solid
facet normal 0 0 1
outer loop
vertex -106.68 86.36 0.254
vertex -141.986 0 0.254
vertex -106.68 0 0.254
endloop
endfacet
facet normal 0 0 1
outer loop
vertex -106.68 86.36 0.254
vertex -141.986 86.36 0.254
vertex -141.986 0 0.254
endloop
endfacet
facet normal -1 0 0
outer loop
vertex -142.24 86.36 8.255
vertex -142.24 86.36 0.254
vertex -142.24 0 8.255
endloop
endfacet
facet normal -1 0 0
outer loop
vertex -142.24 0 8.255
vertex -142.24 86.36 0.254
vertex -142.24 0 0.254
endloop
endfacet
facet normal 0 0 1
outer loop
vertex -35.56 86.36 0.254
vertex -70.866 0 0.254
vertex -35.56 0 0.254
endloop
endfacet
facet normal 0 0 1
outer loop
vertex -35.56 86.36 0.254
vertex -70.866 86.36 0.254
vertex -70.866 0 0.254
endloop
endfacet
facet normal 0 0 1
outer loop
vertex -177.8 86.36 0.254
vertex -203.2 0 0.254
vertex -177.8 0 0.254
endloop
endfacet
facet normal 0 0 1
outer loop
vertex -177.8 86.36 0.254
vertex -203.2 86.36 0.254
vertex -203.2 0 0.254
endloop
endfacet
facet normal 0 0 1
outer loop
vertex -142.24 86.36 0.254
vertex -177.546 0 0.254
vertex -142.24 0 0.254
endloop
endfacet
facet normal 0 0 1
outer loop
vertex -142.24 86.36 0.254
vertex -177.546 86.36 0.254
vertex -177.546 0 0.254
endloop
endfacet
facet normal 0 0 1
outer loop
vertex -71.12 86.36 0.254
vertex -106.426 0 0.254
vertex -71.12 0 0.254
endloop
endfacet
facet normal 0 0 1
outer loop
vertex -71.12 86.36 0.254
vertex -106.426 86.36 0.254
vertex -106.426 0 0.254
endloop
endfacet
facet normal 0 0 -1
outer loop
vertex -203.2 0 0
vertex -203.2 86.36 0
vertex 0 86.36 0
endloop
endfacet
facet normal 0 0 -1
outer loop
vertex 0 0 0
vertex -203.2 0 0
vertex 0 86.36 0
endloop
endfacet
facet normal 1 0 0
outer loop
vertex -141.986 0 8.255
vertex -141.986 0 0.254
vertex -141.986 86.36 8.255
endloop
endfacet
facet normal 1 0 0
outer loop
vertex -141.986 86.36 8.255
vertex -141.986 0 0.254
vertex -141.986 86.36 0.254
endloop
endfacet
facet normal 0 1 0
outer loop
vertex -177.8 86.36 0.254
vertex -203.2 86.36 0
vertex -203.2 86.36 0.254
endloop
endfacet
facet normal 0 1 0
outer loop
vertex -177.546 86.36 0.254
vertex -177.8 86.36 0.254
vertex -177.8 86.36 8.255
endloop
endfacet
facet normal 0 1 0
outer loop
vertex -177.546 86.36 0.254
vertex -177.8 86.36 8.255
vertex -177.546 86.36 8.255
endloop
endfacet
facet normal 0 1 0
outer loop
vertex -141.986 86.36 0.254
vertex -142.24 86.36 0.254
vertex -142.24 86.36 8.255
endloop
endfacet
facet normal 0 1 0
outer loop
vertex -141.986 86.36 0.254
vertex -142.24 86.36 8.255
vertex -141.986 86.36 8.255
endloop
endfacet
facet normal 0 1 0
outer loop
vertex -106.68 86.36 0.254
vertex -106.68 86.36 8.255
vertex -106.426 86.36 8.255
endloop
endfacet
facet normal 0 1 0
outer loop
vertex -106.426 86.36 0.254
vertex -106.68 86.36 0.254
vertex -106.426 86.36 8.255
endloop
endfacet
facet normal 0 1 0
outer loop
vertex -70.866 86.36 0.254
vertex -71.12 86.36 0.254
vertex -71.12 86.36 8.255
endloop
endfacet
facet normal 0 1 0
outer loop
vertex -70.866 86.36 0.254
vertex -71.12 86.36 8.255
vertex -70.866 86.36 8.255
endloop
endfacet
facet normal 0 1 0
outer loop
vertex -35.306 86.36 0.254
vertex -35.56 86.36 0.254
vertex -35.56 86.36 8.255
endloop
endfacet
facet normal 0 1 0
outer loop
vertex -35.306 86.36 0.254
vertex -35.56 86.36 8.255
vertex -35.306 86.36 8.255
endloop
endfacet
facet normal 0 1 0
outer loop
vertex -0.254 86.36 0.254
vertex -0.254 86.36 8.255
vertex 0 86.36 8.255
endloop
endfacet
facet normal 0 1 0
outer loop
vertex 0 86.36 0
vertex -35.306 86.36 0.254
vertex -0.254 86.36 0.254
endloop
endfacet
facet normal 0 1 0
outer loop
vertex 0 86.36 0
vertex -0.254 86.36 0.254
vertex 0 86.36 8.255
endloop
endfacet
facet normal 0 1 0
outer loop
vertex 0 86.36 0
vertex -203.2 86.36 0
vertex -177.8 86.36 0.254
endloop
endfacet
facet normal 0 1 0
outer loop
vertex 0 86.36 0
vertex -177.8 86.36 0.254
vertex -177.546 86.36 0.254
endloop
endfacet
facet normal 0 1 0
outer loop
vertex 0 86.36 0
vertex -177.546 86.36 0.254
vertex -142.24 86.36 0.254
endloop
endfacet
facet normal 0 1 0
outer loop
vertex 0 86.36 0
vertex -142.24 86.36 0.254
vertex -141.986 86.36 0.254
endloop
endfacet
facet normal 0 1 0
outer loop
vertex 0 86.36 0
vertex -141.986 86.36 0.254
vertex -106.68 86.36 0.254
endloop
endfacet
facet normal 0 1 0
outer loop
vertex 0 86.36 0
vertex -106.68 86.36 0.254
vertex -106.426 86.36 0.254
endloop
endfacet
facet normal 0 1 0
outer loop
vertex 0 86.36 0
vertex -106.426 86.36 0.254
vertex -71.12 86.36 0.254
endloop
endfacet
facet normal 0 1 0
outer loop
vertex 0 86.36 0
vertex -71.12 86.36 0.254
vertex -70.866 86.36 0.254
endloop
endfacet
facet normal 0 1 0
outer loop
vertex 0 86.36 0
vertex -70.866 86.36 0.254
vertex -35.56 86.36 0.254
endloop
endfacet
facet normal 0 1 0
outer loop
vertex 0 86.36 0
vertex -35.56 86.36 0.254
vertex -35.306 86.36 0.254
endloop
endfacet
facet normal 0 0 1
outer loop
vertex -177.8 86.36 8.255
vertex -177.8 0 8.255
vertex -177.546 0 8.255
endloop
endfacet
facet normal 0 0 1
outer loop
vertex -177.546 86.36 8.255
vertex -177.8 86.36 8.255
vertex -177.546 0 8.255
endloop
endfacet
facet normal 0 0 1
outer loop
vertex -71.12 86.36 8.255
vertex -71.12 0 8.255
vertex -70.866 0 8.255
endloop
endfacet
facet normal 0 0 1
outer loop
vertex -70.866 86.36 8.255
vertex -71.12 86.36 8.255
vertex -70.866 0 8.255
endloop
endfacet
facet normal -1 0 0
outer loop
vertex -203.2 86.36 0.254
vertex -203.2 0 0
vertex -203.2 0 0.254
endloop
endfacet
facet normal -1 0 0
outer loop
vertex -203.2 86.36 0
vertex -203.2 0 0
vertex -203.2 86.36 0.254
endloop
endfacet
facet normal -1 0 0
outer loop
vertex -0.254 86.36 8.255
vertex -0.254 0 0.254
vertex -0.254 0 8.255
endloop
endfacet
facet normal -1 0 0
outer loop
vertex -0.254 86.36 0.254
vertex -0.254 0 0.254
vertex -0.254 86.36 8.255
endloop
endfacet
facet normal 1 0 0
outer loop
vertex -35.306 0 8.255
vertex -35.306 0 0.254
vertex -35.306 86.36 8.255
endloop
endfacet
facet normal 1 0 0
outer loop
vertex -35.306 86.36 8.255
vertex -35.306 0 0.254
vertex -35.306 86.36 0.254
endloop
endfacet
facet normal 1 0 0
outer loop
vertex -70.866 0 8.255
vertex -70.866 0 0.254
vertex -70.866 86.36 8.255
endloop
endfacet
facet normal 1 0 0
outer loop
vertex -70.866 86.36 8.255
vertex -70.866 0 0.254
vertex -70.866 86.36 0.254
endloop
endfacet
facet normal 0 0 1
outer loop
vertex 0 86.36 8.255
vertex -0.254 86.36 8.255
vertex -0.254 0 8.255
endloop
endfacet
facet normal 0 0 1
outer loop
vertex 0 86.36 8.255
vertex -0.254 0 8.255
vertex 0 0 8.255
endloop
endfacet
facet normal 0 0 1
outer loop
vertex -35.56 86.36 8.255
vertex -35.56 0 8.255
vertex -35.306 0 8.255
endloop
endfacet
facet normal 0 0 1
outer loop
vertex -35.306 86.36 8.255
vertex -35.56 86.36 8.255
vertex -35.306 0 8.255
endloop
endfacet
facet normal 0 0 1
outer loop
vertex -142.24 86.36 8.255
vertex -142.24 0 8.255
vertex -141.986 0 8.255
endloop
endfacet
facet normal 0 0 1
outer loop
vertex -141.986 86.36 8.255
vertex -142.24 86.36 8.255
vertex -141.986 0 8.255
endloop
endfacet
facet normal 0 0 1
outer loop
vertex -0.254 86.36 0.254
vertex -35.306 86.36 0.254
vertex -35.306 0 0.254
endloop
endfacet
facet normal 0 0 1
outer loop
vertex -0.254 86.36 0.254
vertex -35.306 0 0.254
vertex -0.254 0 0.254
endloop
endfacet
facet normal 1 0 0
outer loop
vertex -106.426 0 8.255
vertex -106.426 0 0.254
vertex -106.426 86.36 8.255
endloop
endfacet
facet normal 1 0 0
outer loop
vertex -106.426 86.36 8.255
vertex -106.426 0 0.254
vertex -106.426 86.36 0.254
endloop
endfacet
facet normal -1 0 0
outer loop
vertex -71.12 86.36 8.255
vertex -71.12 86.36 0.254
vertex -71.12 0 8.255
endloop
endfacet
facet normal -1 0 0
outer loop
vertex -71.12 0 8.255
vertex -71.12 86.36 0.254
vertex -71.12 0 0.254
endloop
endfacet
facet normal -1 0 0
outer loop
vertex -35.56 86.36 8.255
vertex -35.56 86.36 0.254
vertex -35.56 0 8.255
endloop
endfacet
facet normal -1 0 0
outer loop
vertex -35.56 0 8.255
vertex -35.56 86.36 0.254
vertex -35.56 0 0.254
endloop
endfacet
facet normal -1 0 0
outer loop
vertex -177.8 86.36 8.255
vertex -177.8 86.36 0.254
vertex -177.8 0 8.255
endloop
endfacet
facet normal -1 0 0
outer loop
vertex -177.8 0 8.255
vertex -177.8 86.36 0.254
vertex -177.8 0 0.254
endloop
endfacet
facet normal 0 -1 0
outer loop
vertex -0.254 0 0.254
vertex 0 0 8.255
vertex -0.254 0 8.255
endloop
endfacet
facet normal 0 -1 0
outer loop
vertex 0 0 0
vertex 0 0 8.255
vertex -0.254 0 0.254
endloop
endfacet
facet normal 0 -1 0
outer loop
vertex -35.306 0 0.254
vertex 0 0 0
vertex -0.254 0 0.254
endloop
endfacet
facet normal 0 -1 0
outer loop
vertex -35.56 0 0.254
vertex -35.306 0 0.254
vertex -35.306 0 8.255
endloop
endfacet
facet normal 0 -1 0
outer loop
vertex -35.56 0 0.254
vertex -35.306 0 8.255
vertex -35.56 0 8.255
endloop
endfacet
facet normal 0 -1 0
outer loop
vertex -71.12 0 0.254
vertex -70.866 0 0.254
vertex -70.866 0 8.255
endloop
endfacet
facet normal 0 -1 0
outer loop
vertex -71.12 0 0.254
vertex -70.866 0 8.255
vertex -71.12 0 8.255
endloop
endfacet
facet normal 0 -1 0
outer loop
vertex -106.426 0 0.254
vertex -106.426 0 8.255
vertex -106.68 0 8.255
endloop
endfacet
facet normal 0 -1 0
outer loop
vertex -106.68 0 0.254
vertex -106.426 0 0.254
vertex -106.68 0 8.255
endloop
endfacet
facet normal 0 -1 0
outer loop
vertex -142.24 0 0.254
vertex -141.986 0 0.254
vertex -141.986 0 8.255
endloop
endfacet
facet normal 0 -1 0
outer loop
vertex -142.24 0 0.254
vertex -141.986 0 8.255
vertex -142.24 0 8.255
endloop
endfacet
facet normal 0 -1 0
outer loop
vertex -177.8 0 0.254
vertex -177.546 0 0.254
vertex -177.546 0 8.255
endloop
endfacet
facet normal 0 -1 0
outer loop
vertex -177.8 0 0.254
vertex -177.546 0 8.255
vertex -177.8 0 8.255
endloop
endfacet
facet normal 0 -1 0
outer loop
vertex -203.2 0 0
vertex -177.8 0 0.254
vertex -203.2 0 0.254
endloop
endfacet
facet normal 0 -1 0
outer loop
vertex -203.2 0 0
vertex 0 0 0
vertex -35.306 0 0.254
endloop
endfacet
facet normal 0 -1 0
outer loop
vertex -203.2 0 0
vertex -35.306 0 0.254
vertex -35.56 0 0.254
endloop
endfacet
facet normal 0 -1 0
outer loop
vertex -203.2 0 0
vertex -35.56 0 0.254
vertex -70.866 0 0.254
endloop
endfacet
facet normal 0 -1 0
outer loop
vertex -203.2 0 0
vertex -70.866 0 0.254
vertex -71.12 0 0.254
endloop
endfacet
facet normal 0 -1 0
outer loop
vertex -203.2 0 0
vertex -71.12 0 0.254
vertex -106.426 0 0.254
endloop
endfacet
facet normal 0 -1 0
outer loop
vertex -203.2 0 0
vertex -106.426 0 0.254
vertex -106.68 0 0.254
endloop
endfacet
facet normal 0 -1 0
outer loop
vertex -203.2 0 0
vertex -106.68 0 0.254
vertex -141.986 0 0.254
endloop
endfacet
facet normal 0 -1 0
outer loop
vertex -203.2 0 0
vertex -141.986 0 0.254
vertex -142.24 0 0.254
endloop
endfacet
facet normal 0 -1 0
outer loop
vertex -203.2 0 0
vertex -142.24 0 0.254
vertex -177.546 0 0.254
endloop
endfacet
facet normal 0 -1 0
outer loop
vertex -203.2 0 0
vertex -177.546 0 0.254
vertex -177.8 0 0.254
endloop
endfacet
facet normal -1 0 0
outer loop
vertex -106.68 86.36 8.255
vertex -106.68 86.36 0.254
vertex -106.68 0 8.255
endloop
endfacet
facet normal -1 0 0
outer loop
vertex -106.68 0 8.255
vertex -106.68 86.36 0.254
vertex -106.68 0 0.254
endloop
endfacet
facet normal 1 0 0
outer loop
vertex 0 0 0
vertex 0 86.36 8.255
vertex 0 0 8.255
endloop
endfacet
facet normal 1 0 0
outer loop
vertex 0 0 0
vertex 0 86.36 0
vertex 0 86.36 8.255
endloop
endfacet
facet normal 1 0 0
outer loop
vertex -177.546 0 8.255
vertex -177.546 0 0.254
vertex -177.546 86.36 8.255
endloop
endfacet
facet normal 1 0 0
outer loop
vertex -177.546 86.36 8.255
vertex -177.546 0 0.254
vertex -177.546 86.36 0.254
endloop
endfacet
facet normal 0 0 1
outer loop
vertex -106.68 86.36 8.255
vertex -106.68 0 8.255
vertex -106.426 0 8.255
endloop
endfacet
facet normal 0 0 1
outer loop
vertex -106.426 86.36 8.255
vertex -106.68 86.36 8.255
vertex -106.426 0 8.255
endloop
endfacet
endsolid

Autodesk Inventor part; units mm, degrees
ref_plane "YZ Plane" through (0, 0, 0) normal (1, 0, 0) x (0, 1, 0)
ref_plane "XZ Plane" through (0, 0, 0) normal (0, 1, 0) x (-1, 0, 0)
ref_plane "XY Plane" through (0, 0, 0) normal (0, 0, 1) x (1, 0, 0)
sketch "Sketch1" plane through (0, 0, 0) normal (0, 0, 1) x (1, 0, 0)
  line L0 (0, 0) -> (-203.2, 0)
  line L1 (-203.2, 0) -> (-203.2, 86.36)
  line L2 (-203.2, 86.36) -> (0, 86.36)
  line L3 (0, 86.36) -> (0, 0)
  dimension "d0" = 203.2
  dimension "d1" = 86.36
extrude "Extrusion1" add sketch "Sketch1" along normal blind 0.254
sketch "Sketch2" plane through (0, 0, 0.254) normal (0, 0, 1) x (1, 0, 0)
  line L0 (-203.2, 0) -> (0, 0) projected
  line L1 (0, 0) -> (-0.254, 0)
  line L2 (-0.254, 0) -> (-0.254, 86.36)
  line L3 (-0.254, 86.36) -> (0, 86.36)
  line L4 (0, 86.36) -> (0, 0)
  dimension "d4" = 0.254
extrude "Extrusion2" add sketch "Sketch2" along normal blind 8.001
sketch "Sketch3" plane through (0, 0, 0) normal (1, 0, 0) x (0, 0, -1)
  point P0 (0, 0)
sketch "Sketch4" plane through (0, 0, 0.254) normal (0, 0, 1) x (1, 0, 0)
  line L0 (0, 0) -> (-203.2, 0) projected
  line L1 (-203.2, 86.36) -> (0, 86.36) projected
  line L2 (-35.56, 0) -> (-35.306, 0)
  line L3 (-35.306, 0) -> (-35.306, 86.36)
  line L4 (-35.306, 86.36) -> (-35.56, 86.36)
  line L5 (-35.56, 86.36) -> (-35.56, 0)
  dimension "d7" = 0.254
extrude "Extrusion3" add sketch "Sketch4" along normal blind 8.001
sketch "Sketch5" plane through (0, 0, 0.254) normal (0, 0, 1) x (1, 0, 0)
  line L0 (0, 0) -> (-203.2, 0) projected
  line L1 (-203.2, 86.36) -> (0, 86.36) projected
  line L2 (-71.12, 0) -> (-70.866, 0)
  line L3 (-70.866, 0) -> (-70.866, 86.36)
  line L4 (-70.866, 86.36) -> (-71.12, 86.36)
  line L5 (-71.12, 86.36) -> (-71.12, 0)
  line L6 (-106.68, 0) -> (-106.426, 0)
  line L7 (-106.426, 0) -> (-106.426, 86.36)
  line L8 (-106.426, 86.36) -> (-106.68, 86.36)
  line L9 (-106.68, 86.36) -> (-106.68, 0)
  line L10 (-142.24, 0) -> (-141.986, 0)
  line L11 (-141.986, 0) -> (-141.986, 86.36)
  line L12 (-141.986, 86.36) -> (-142.24, 86.36)
  line L13 (-142.24, 86.36) -> (-142.24, 0)
  line L14 (-177.8, 0) -> (-177.546, 0)
  line L15 (-177.546, 0) -> (-177.546, 86.36)
  line L16 (-177.546, 86.36) -> (-177.8, 86.36)
  line L17 (-177.8, 86.36) -> (-177.8, 0)
  dimension "d10" = 0.254
  dimension "d11" = 0.254
  dimension "d12" = 0.254
  dimension "d13" = 0.254
extrude "Extrusion4" add sketch "Sketch5" along normal blind 8.001 contours L0 L5 L1 L3
sketch "Sketch6" plane through (0, 0, 0.254) normal (0, 0, 1) x (1, 0, 0)
  line L0 (0, 0) -> (-203.2, 0) projected
  line L1 (-203.2, 86.36) -> (0, 86.36) projected
  line L2 (-106.68, 0) -> (-106.426, 0)
  line L3 (-106.426, 0) -> (-106.426, 86.36)
  line L4 (-106.426, 86.36) -> (-106.68, 86.36)
  line L5 (-106.68, 86.36) -> (-106.68, 0)
  dimension "d16" = 0.254
extrude "Extrusion5" add sketch "Sketch6" along normal blind 8.001
sketch "Sketch7" plane through (0, 0, 0.254) normal (0, 0, 1) x (1, 0, 0)
  line L0 (-203.2, 0) -> (-106.68, 0) projected
  line L1 (-106.68, 86.36) -> (-203.2, 86.36) projected
  line L2 (-142.24, 0) -> (-141.986, 0)
  line L3 (-141.986, 0) -> (-141.986, 86.36)
  line L4 (-141.986, 86.36) -> (-142.24, 86.36)
  line L5 (-142.24, 86.36) -> (-142.24, 0)
  point P0 (0, 0)
  dimension "d19" = 0.254
extrude "Extrusion6" add sketch "Sketch7" along normal blind 8.001
sketch "Sketch8" plane through (0, 0, 0.254) normal (0, 0, 1) x (1, 0, 0)
  line L0 (0, 0) -> (-203.2, 0) projected
  line L1 (-203.2, 86.36) -> (0, 86.36) projected
  line L2 (-177.8, 0) -> (-177.546, 0)
  line L3 (-177.546, 0) -> (-177.546, 86.36)
  line L4 (-177.546, 86.36) -> (-177.8, 86.36)
  line L5 (-177.8, 86.36) -> (-177.8, 0)
  dimension "d22" = 0.254
extrude "Extrusion7" add sketch "Sketch8" along normal blind 8.001
properties part number "ModuleHolder"
